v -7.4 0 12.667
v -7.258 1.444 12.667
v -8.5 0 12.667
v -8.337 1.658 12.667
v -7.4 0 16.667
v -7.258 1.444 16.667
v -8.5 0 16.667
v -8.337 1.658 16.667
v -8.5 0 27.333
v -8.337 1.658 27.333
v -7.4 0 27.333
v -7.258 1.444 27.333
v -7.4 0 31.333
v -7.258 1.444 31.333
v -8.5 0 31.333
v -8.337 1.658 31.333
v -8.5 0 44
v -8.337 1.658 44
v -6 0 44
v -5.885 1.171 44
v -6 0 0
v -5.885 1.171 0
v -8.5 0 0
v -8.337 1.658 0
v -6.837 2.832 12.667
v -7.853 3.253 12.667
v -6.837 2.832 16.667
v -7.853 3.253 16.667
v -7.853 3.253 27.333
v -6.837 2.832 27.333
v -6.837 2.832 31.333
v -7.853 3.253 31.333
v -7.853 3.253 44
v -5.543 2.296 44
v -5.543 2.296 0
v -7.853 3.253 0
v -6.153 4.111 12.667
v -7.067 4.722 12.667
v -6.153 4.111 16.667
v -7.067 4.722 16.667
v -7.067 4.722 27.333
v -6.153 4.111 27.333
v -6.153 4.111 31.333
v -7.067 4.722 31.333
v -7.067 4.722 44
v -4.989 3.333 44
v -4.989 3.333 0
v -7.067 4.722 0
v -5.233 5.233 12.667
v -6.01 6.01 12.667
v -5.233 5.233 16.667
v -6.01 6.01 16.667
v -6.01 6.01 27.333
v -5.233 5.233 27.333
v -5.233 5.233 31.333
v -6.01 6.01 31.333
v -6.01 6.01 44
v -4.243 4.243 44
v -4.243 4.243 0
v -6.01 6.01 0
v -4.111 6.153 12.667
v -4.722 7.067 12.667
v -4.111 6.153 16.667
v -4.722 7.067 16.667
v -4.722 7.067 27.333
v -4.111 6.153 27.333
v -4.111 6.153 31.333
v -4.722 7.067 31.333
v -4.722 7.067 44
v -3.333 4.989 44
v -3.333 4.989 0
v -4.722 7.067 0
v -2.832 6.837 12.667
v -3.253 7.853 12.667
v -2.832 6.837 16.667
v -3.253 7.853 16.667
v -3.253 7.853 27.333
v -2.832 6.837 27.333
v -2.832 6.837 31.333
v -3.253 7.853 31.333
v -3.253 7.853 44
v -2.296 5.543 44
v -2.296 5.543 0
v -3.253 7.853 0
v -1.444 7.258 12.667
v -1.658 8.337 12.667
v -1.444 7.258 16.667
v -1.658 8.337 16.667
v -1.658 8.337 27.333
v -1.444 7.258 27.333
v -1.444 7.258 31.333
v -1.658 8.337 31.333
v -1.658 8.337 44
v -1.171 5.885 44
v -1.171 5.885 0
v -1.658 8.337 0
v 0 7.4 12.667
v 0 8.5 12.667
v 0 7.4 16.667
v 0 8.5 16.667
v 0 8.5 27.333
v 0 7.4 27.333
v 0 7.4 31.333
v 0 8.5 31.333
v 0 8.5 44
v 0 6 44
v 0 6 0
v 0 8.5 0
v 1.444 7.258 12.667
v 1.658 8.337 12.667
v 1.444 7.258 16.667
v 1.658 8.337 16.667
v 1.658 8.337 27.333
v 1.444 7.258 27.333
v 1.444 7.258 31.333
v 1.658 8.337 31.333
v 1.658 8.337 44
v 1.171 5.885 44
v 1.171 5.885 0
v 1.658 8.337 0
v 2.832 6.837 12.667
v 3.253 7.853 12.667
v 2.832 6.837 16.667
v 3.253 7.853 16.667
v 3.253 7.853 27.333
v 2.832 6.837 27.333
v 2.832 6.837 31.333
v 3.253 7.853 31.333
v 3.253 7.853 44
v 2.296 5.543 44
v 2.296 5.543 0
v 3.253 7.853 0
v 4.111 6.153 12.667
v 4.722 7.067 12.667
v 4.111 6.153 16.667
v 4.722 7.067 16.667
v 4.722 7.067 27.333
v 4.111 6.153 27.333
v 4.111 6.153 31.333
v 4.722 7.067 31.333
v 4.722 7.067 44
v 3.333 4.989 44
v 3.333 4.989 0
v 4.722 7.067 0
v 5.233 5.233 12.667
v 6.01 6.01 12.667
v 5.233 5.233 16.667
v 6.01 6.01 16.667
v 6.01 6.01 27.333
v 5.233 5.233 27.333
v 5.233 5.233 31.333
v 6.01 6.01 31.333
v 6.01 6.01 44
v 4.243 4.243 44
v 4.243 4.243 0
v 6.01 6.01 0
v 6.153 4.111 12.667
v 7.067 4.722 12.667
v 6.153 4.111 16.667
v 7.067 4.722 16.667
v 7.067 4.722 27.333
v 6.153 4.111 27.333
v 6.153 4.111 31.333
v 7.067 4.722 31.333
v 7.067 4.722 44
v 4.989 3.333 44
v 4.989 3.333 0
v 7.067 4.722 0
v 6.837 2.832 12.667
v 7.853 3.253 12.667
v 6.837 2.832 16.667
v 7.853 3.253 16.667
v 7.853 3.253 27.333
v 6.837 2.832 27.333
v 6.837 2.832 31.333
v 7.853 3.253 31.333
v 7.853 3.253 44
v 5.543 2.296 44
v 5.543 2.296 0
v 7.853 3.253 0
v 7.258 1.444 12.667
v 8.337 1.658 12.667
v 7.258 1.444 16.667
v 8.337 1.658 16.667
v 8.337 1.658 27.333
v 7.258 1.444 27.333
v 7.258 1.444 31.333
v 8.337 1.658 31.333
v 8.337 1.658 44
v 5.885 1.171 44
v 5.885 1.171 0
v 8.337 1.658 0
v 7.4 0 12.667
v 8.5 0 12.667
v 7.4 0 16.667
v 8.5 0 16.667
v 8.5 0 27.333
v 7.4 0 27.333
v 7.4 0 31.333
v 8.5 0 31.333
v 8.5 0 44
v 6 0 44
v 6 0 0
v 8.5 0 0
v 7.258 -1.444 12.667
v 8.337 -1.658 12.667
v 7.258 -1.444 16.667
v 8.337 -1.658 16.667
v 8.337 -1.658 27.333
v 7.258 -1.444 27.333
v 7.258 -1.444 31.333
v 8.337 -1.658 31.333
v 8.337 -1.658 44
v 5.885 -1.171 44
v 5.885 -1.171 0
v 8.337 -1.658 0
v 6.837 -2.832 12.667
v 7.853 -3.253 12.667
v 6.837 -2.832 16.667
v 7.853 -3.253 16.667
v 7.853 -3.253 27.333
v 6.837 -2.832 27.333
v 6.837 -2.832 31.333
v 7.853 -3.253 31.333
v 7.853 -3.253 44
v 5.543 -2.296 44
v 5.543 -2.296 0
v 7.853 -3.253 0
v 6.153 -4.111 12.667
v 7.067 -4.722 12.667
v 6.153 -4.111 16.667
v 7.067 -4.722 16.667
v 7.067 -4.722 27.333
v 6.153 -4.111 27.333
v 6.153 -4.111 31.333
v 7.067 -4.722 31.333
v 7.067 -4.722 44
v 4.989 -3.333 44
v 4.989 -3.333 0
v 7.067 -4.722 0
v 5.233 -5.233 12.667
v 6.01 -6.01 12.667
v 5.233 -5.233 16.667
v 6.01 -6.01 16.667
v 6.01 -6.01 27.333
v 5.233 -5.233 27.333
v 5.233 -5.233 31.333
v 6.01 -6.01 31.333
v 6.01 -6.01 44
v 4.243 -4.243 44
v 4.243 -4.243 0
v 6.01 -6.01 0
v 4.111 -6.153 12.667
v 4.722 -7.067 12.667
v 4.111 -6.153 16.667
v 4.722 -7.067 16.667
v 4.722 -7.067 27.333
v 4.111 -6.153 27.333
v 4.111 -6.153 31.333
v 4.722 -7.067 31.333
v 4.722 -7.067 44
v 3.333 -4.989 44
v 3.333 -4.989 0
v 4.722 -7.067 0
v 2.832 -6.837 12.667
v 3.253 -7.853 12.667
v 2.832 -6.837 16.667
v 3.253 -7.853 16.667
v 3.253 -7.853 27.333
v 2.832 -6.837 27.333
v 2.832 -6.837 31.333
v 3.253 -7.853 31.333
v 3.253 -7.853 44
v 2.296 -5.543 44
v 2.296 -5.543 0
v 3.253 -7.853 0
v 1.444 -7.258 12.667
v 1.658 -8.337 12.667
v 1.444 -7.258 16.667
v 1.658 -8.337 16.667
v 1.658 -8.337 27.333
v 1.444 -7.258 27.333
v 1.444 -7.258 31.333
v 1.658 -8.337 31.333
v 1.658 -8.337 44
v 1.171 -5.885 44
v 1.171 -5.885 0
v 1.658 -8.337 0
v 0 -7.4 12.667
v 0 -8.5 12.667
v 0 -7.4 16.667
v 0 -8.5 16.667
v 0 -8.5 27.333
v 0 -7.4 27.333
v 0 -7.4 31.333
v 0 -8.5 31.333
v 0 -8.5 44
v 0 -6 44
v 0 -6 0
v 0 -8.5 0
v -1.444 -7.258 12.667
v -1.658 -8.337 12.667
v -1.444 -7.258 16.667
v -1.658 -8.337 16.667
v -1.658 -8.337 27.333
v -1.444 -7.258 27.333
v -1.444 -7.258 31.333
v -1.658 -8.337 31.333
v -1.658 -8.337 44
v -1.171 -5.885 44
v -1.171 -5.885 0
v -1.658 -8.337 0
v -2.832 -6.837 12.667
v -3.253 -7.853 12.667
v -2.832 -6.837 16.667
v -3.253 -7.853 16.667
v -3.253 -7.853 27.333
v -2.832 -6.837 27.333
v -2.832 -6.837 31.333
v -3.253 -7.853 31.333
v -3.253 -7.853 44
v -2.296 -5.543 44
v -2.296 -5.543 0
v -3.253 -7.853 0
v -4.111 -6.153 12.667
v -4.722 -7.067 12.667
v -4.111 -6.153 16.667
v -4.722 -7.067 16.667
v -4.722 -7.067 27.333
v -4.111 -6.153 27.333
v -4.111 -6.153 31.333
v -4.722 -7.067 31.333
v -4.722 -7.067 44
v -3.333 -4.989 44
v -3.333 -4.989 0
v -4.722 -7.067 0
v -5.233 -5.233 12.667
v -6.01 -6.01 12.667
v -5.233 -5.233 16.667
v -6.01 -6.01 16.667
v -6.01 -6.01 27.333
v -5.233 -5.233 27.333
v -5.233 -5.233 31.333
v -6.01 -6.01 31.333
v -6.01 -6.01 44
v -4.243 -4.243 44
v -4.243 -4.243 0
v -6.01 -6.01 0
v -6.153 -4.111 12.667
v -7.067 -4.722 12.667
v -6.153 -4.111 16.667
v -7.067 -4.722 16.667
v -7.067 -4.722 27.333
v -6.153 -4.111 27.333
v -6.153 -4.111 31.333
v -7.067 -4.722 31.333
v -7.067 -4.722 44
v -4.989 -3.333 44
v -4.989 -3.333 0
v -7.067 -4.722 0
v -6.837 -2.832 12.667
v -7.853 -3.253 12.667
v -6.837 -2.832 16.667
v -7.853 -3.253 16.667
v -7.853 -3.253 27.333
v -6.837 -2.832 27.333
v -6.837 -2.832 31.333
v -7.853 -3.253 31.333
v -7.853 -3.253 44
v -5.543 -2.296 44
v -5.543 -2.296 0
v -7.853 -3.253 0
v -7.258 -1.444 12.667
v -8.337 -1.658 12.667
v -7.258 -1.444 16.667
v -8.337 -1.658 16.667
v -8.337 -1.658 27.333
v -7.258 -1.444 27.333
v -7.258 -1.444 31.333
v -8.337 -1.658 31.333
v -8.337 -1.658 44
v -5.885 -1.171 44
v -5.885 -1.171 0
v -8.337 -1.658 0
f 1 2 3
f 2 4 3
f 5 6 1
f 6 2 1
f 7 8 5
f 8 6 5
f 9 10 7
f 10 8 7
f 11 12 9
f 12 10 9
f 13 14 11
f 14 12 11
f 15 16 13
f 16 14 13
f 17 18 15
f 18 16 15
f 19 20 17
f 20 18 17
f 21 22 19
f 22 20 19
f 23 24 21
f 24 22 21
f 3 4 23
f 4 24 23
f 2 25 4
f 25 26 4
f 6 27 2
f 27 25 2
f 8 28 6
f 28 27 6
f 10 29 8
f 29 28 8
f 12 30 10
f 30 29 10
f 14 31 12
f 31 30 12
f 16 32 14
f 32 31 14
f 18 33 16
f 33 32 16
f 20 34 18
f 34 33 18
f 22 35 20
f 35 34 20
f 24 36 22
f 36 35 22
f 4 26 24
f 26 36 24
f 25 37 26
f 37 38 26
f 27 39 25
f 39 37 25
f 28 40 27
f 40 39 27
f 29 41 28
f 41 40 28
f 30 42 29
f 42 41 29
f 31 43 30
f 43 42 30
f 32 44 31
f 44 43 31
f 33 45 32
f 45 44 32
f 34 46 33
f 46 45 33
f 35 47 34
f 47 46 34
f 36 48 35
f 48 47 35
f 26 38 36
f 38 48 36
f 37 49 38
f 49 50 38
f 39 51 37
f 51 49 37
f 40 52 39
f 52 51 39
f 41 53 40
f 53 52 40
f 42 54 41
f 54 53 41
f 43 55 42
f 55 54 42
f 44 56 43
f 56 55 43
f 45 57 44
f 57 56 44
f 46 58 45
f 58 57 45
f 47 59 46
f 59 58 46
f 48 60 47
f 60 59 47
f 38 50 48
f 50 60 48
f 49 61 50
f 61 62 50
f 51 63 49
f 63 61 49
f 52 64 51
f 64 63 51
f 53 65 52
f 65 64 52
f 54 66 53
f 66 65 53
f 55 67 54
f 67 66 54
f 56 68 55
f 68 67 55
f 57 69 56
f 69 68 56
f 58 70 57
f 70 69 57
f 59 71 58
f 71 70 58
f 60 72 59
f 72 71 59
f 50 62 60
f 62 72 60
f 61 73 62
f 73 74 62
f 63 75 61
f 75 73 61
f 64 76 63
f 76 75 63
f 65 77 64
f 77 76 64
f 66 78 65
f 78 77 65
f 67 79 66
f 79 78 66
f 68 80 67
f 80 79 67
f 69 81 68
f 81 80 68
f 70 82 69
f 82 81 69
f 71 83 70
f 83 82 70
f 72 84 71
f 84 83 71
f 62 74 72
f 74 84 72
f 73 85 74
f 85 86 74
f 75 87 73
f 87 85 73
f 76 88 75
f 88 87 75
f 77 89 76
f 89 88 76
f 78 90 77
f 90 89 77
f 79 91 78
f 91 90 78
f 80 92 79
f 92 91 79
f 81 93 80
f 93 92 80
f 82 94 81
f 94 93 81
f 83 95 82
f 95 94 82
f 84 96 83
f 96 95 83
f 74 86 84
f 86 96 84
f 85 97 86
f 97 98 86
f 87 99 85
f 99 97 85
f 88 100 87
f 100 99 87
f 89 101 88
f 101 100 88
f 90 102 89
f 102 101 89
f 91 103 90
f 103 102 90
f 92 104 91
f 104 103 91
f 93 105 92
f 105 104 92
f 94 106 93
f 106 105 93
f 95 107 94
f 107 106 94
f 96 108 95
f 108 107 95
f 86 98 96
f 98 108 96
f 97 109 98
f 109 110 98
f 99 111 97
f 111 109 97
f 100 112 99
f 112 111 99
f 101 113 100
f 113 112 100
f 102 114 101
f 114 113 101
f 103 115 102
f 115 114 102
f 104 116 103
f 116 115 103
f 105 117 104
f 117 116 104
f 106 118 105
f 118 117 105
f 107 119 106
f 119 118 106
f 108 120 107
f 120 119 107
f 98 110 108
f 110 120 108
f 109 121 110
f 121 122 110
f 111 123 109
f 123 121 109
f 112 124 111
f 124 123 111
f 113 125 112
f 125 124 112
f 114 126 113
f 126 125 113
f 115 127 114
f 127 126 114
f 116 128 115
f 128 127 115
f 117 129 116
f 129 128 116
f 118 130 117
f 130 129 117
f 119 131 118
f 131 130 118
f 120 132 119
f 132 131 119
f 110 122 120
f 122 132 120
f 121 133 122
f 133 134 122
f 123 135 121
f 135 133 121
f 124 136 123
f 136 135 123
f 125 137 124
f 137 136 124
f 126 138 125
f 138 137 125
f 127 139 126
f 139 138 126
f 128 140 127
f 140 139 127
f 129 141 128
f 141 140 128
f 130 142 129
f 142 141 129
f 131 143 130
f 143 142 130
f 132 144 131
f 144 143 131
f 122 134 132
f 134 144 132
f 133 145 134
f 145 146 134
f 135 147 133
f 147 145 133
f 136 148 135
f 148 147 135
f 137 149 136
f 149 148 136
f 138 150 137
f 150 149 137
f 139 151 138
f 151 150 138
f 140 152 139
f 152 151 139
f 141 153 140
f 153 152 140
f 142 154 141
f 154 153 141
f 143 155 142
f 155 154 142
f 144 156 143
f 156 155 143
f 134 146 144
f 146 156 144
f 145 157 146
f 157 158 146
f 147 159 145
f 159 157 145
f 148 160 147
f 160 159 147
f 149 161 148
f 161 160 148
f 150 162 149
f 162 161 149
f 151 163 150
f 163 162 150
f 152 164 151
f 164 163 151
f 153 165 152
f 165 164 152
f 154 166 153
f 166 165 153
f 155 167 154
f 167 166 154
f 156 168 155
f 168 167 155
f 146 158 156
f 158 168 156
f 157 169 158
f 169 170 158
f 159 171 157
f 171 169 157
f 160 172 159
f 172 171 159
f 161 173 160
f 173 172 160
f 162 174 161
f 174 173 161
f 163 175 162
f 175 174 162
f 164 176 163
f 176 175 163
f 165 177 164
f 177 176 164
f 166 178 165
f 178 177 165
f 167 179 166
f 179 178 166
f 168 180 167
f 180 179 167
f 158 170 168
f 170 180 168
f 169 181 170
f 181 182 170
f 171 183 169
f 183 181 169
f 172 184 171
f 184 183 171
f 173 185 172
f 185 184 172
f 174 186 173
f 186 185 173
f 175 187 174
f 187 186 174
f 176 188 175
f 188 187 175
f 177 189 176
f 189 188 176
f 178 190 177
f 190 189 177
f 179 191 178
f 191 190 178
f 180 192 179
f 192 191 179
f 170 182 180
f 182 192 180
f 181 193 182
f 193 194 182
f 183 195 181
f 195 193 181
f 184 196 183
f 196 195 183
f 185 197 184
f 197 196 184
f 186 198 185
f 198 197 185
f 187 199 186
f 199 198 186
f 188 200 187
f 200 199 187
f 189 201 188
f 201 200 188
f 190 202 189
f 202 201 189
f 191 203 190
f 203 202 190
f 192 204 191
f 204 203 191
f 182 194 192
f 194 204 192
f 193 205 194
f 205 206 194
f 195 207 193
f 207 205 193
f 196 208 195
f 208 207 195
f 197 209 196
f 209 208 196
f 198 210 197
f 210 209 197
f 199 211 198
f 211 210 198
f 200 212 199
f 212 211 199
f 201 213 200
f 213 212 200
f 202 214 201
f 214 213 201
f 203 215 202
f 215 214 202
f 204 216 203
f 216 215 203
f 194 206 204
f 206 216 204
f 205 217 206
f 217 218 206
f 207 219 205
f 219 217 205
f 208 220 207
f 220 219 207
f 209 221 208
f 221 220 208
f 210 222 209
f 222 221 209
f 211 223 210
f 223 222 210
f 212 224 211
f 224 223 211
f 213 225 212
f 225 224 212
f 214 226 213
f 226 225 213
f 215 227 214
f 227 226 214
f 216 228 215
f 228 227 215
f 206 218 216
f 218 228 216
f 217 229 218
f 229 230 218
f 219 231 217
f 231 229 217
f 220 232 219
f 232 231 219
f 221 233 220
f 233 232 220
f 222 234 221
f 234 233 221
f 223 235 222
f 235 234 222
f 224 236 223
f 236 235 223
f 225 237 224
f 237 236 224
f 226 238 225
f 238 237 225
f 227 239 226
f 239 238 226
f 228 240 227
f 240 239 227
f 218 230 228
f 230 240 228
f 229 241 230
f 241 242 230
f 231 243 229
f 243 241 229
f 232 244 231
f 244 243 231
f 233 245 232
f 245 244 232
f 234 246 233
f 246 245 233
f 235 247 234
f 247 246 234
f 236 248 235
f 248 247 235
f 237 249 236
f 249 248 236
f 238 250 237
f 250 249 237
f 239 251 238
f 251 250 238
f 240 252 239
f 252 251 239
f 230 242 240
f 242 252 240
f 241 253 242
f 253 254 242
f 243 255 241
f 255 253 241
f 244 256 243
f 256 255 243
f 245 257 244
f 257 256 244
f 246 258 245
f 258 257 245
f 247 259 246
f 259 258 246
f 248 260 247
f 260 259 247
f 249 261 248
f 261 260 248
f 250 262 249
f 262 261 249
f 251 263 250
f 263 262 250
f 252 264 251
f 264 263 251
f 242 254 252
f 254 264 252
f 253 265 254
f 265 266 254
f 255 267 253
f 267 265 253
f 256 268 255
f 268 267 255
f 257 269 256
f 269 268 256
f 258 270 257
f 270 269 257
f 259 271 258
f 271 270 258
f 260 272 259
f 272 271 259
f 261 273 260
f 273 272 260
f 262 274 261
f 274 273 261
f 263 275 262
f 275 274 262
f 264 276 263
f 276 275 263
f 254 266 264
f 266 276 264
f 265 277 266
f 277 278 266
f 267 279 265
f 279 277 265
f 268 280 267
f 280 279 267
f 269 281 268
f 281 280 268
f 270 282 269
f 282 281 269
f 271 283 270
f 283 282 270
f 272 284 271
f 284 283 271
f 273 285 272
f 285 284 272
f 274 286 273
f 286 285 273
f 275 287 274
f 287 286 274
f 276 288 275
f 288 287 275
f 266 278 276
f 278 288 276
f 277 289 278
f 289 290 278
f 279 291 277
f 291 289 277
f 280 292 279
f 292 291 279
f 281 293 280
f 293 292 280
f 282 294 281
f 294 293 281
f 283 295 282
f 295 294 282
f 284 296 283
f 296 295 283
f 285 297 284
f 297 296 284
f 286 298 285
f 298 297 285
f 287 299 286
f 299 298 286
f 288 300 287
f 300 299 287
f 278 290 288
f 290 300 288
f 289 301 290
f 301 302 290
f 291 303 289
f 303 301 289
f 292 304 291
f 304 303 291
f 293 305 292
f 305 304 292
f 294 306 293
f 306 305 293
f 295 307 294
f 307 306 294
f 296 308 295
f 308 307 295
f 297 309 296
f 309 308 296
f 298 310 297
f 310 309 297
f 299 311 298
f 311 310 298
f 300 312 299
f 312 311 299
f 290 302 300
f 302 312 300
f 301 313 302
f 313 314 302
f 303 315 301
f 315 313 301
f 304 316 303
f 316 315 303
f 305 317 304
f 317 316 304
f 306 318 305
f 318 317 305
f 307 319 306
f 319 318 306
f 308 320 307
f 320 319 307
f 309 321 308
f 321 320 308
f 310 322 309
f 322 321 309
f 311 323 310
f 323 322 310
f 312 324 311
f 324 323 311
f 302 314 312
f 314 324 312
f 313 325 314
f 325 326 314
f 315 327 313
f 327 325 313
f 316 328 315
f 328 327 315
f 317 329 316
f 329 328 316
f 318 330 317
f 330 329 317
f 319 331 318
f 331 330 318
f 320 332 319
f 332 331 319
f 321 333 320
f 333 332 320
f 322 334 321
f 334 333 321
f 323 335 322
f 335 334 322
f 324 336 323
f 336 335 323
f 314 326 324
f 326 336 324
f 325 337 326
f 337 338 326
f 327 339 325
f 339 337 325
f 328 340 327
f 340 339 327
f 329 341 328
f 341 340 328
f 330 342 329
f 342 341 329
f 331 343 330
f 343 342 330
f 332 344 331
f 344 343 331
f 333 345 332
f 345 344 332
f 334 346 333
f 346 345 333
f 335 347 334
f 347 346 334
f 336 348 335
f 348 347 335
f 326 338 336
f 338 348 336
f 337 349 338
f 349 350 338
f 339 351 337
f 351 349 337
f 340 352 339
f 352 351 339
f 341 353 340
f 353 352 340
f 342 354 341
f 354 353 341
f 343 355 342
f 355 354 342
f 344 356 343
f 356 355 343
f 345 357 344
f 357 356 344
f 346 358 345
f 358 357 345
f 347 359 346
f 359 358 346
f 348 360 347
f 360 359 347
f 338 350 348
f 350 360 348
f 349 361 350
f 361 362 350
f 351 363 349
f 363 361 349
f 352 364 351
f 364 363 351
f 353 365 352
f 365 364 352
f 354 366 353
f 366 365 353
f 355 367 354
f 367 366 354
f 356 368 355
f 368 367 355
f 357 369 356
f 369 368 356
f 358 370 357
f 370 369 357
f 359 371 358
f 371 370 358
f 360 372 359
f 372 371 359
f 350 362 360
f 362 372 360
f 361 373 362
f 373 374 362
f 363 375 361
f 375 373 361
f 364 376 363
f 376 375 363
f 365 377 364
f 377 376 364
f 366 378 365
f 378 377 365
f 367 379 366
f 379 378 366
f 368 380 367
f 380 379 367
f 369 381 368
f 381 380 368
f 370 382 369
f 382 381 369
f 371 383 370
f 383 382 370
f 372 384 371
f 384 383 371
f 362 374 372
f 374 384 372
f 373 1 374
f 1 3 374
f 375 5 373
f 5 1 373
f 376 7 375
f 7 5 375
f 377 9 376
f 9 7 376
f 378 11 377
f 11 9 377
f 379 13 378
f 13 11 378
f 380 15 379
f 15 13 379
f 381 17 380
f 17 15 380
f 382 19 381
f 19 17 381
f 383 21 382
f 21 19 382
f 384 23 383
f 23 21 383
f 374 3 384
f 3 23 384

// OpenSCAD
$fn = 32;

// ----------------------------------------------------------------------
// Grooved revolve: stepped, bore R6
// ----------------------------------------------------------------------

// --- parameters (mm) ---
bore_r = 6;               // bore radius
outer_r = 8.5;            // outer radius of the body
total_h = 44;             // overall height, Z
wall = 2.5;               // radial wall thickness
groove_w = 4;             // groove width
groove_d = 1.1;           // groove depth
grooves = 2;              // number of outer grooves

bbox_x = 2 * outer_r;  // full diameter
bore_d = 2 * bore_r;  // bore diameter
body_d = 2 * outer_r;  // body diameter
revolve_angle = 360;  // full turn around the Z axis

profile = [[6, 0], [8.5, 0], [8.5, 12.667], [7.4, 12.667], [7.4, 16.667], [8.5, 16.667], [8.5, 27.333], [7.4, 27.333], [7.4, 31.333], [8.5, 31.333], [8.5, 44], [6, 44]];  // primary outline, 12 points, counter clockwise

// --- the one profile operation ---
rotate_extrude(angle = revolve_angle) polygon(points = profile);
